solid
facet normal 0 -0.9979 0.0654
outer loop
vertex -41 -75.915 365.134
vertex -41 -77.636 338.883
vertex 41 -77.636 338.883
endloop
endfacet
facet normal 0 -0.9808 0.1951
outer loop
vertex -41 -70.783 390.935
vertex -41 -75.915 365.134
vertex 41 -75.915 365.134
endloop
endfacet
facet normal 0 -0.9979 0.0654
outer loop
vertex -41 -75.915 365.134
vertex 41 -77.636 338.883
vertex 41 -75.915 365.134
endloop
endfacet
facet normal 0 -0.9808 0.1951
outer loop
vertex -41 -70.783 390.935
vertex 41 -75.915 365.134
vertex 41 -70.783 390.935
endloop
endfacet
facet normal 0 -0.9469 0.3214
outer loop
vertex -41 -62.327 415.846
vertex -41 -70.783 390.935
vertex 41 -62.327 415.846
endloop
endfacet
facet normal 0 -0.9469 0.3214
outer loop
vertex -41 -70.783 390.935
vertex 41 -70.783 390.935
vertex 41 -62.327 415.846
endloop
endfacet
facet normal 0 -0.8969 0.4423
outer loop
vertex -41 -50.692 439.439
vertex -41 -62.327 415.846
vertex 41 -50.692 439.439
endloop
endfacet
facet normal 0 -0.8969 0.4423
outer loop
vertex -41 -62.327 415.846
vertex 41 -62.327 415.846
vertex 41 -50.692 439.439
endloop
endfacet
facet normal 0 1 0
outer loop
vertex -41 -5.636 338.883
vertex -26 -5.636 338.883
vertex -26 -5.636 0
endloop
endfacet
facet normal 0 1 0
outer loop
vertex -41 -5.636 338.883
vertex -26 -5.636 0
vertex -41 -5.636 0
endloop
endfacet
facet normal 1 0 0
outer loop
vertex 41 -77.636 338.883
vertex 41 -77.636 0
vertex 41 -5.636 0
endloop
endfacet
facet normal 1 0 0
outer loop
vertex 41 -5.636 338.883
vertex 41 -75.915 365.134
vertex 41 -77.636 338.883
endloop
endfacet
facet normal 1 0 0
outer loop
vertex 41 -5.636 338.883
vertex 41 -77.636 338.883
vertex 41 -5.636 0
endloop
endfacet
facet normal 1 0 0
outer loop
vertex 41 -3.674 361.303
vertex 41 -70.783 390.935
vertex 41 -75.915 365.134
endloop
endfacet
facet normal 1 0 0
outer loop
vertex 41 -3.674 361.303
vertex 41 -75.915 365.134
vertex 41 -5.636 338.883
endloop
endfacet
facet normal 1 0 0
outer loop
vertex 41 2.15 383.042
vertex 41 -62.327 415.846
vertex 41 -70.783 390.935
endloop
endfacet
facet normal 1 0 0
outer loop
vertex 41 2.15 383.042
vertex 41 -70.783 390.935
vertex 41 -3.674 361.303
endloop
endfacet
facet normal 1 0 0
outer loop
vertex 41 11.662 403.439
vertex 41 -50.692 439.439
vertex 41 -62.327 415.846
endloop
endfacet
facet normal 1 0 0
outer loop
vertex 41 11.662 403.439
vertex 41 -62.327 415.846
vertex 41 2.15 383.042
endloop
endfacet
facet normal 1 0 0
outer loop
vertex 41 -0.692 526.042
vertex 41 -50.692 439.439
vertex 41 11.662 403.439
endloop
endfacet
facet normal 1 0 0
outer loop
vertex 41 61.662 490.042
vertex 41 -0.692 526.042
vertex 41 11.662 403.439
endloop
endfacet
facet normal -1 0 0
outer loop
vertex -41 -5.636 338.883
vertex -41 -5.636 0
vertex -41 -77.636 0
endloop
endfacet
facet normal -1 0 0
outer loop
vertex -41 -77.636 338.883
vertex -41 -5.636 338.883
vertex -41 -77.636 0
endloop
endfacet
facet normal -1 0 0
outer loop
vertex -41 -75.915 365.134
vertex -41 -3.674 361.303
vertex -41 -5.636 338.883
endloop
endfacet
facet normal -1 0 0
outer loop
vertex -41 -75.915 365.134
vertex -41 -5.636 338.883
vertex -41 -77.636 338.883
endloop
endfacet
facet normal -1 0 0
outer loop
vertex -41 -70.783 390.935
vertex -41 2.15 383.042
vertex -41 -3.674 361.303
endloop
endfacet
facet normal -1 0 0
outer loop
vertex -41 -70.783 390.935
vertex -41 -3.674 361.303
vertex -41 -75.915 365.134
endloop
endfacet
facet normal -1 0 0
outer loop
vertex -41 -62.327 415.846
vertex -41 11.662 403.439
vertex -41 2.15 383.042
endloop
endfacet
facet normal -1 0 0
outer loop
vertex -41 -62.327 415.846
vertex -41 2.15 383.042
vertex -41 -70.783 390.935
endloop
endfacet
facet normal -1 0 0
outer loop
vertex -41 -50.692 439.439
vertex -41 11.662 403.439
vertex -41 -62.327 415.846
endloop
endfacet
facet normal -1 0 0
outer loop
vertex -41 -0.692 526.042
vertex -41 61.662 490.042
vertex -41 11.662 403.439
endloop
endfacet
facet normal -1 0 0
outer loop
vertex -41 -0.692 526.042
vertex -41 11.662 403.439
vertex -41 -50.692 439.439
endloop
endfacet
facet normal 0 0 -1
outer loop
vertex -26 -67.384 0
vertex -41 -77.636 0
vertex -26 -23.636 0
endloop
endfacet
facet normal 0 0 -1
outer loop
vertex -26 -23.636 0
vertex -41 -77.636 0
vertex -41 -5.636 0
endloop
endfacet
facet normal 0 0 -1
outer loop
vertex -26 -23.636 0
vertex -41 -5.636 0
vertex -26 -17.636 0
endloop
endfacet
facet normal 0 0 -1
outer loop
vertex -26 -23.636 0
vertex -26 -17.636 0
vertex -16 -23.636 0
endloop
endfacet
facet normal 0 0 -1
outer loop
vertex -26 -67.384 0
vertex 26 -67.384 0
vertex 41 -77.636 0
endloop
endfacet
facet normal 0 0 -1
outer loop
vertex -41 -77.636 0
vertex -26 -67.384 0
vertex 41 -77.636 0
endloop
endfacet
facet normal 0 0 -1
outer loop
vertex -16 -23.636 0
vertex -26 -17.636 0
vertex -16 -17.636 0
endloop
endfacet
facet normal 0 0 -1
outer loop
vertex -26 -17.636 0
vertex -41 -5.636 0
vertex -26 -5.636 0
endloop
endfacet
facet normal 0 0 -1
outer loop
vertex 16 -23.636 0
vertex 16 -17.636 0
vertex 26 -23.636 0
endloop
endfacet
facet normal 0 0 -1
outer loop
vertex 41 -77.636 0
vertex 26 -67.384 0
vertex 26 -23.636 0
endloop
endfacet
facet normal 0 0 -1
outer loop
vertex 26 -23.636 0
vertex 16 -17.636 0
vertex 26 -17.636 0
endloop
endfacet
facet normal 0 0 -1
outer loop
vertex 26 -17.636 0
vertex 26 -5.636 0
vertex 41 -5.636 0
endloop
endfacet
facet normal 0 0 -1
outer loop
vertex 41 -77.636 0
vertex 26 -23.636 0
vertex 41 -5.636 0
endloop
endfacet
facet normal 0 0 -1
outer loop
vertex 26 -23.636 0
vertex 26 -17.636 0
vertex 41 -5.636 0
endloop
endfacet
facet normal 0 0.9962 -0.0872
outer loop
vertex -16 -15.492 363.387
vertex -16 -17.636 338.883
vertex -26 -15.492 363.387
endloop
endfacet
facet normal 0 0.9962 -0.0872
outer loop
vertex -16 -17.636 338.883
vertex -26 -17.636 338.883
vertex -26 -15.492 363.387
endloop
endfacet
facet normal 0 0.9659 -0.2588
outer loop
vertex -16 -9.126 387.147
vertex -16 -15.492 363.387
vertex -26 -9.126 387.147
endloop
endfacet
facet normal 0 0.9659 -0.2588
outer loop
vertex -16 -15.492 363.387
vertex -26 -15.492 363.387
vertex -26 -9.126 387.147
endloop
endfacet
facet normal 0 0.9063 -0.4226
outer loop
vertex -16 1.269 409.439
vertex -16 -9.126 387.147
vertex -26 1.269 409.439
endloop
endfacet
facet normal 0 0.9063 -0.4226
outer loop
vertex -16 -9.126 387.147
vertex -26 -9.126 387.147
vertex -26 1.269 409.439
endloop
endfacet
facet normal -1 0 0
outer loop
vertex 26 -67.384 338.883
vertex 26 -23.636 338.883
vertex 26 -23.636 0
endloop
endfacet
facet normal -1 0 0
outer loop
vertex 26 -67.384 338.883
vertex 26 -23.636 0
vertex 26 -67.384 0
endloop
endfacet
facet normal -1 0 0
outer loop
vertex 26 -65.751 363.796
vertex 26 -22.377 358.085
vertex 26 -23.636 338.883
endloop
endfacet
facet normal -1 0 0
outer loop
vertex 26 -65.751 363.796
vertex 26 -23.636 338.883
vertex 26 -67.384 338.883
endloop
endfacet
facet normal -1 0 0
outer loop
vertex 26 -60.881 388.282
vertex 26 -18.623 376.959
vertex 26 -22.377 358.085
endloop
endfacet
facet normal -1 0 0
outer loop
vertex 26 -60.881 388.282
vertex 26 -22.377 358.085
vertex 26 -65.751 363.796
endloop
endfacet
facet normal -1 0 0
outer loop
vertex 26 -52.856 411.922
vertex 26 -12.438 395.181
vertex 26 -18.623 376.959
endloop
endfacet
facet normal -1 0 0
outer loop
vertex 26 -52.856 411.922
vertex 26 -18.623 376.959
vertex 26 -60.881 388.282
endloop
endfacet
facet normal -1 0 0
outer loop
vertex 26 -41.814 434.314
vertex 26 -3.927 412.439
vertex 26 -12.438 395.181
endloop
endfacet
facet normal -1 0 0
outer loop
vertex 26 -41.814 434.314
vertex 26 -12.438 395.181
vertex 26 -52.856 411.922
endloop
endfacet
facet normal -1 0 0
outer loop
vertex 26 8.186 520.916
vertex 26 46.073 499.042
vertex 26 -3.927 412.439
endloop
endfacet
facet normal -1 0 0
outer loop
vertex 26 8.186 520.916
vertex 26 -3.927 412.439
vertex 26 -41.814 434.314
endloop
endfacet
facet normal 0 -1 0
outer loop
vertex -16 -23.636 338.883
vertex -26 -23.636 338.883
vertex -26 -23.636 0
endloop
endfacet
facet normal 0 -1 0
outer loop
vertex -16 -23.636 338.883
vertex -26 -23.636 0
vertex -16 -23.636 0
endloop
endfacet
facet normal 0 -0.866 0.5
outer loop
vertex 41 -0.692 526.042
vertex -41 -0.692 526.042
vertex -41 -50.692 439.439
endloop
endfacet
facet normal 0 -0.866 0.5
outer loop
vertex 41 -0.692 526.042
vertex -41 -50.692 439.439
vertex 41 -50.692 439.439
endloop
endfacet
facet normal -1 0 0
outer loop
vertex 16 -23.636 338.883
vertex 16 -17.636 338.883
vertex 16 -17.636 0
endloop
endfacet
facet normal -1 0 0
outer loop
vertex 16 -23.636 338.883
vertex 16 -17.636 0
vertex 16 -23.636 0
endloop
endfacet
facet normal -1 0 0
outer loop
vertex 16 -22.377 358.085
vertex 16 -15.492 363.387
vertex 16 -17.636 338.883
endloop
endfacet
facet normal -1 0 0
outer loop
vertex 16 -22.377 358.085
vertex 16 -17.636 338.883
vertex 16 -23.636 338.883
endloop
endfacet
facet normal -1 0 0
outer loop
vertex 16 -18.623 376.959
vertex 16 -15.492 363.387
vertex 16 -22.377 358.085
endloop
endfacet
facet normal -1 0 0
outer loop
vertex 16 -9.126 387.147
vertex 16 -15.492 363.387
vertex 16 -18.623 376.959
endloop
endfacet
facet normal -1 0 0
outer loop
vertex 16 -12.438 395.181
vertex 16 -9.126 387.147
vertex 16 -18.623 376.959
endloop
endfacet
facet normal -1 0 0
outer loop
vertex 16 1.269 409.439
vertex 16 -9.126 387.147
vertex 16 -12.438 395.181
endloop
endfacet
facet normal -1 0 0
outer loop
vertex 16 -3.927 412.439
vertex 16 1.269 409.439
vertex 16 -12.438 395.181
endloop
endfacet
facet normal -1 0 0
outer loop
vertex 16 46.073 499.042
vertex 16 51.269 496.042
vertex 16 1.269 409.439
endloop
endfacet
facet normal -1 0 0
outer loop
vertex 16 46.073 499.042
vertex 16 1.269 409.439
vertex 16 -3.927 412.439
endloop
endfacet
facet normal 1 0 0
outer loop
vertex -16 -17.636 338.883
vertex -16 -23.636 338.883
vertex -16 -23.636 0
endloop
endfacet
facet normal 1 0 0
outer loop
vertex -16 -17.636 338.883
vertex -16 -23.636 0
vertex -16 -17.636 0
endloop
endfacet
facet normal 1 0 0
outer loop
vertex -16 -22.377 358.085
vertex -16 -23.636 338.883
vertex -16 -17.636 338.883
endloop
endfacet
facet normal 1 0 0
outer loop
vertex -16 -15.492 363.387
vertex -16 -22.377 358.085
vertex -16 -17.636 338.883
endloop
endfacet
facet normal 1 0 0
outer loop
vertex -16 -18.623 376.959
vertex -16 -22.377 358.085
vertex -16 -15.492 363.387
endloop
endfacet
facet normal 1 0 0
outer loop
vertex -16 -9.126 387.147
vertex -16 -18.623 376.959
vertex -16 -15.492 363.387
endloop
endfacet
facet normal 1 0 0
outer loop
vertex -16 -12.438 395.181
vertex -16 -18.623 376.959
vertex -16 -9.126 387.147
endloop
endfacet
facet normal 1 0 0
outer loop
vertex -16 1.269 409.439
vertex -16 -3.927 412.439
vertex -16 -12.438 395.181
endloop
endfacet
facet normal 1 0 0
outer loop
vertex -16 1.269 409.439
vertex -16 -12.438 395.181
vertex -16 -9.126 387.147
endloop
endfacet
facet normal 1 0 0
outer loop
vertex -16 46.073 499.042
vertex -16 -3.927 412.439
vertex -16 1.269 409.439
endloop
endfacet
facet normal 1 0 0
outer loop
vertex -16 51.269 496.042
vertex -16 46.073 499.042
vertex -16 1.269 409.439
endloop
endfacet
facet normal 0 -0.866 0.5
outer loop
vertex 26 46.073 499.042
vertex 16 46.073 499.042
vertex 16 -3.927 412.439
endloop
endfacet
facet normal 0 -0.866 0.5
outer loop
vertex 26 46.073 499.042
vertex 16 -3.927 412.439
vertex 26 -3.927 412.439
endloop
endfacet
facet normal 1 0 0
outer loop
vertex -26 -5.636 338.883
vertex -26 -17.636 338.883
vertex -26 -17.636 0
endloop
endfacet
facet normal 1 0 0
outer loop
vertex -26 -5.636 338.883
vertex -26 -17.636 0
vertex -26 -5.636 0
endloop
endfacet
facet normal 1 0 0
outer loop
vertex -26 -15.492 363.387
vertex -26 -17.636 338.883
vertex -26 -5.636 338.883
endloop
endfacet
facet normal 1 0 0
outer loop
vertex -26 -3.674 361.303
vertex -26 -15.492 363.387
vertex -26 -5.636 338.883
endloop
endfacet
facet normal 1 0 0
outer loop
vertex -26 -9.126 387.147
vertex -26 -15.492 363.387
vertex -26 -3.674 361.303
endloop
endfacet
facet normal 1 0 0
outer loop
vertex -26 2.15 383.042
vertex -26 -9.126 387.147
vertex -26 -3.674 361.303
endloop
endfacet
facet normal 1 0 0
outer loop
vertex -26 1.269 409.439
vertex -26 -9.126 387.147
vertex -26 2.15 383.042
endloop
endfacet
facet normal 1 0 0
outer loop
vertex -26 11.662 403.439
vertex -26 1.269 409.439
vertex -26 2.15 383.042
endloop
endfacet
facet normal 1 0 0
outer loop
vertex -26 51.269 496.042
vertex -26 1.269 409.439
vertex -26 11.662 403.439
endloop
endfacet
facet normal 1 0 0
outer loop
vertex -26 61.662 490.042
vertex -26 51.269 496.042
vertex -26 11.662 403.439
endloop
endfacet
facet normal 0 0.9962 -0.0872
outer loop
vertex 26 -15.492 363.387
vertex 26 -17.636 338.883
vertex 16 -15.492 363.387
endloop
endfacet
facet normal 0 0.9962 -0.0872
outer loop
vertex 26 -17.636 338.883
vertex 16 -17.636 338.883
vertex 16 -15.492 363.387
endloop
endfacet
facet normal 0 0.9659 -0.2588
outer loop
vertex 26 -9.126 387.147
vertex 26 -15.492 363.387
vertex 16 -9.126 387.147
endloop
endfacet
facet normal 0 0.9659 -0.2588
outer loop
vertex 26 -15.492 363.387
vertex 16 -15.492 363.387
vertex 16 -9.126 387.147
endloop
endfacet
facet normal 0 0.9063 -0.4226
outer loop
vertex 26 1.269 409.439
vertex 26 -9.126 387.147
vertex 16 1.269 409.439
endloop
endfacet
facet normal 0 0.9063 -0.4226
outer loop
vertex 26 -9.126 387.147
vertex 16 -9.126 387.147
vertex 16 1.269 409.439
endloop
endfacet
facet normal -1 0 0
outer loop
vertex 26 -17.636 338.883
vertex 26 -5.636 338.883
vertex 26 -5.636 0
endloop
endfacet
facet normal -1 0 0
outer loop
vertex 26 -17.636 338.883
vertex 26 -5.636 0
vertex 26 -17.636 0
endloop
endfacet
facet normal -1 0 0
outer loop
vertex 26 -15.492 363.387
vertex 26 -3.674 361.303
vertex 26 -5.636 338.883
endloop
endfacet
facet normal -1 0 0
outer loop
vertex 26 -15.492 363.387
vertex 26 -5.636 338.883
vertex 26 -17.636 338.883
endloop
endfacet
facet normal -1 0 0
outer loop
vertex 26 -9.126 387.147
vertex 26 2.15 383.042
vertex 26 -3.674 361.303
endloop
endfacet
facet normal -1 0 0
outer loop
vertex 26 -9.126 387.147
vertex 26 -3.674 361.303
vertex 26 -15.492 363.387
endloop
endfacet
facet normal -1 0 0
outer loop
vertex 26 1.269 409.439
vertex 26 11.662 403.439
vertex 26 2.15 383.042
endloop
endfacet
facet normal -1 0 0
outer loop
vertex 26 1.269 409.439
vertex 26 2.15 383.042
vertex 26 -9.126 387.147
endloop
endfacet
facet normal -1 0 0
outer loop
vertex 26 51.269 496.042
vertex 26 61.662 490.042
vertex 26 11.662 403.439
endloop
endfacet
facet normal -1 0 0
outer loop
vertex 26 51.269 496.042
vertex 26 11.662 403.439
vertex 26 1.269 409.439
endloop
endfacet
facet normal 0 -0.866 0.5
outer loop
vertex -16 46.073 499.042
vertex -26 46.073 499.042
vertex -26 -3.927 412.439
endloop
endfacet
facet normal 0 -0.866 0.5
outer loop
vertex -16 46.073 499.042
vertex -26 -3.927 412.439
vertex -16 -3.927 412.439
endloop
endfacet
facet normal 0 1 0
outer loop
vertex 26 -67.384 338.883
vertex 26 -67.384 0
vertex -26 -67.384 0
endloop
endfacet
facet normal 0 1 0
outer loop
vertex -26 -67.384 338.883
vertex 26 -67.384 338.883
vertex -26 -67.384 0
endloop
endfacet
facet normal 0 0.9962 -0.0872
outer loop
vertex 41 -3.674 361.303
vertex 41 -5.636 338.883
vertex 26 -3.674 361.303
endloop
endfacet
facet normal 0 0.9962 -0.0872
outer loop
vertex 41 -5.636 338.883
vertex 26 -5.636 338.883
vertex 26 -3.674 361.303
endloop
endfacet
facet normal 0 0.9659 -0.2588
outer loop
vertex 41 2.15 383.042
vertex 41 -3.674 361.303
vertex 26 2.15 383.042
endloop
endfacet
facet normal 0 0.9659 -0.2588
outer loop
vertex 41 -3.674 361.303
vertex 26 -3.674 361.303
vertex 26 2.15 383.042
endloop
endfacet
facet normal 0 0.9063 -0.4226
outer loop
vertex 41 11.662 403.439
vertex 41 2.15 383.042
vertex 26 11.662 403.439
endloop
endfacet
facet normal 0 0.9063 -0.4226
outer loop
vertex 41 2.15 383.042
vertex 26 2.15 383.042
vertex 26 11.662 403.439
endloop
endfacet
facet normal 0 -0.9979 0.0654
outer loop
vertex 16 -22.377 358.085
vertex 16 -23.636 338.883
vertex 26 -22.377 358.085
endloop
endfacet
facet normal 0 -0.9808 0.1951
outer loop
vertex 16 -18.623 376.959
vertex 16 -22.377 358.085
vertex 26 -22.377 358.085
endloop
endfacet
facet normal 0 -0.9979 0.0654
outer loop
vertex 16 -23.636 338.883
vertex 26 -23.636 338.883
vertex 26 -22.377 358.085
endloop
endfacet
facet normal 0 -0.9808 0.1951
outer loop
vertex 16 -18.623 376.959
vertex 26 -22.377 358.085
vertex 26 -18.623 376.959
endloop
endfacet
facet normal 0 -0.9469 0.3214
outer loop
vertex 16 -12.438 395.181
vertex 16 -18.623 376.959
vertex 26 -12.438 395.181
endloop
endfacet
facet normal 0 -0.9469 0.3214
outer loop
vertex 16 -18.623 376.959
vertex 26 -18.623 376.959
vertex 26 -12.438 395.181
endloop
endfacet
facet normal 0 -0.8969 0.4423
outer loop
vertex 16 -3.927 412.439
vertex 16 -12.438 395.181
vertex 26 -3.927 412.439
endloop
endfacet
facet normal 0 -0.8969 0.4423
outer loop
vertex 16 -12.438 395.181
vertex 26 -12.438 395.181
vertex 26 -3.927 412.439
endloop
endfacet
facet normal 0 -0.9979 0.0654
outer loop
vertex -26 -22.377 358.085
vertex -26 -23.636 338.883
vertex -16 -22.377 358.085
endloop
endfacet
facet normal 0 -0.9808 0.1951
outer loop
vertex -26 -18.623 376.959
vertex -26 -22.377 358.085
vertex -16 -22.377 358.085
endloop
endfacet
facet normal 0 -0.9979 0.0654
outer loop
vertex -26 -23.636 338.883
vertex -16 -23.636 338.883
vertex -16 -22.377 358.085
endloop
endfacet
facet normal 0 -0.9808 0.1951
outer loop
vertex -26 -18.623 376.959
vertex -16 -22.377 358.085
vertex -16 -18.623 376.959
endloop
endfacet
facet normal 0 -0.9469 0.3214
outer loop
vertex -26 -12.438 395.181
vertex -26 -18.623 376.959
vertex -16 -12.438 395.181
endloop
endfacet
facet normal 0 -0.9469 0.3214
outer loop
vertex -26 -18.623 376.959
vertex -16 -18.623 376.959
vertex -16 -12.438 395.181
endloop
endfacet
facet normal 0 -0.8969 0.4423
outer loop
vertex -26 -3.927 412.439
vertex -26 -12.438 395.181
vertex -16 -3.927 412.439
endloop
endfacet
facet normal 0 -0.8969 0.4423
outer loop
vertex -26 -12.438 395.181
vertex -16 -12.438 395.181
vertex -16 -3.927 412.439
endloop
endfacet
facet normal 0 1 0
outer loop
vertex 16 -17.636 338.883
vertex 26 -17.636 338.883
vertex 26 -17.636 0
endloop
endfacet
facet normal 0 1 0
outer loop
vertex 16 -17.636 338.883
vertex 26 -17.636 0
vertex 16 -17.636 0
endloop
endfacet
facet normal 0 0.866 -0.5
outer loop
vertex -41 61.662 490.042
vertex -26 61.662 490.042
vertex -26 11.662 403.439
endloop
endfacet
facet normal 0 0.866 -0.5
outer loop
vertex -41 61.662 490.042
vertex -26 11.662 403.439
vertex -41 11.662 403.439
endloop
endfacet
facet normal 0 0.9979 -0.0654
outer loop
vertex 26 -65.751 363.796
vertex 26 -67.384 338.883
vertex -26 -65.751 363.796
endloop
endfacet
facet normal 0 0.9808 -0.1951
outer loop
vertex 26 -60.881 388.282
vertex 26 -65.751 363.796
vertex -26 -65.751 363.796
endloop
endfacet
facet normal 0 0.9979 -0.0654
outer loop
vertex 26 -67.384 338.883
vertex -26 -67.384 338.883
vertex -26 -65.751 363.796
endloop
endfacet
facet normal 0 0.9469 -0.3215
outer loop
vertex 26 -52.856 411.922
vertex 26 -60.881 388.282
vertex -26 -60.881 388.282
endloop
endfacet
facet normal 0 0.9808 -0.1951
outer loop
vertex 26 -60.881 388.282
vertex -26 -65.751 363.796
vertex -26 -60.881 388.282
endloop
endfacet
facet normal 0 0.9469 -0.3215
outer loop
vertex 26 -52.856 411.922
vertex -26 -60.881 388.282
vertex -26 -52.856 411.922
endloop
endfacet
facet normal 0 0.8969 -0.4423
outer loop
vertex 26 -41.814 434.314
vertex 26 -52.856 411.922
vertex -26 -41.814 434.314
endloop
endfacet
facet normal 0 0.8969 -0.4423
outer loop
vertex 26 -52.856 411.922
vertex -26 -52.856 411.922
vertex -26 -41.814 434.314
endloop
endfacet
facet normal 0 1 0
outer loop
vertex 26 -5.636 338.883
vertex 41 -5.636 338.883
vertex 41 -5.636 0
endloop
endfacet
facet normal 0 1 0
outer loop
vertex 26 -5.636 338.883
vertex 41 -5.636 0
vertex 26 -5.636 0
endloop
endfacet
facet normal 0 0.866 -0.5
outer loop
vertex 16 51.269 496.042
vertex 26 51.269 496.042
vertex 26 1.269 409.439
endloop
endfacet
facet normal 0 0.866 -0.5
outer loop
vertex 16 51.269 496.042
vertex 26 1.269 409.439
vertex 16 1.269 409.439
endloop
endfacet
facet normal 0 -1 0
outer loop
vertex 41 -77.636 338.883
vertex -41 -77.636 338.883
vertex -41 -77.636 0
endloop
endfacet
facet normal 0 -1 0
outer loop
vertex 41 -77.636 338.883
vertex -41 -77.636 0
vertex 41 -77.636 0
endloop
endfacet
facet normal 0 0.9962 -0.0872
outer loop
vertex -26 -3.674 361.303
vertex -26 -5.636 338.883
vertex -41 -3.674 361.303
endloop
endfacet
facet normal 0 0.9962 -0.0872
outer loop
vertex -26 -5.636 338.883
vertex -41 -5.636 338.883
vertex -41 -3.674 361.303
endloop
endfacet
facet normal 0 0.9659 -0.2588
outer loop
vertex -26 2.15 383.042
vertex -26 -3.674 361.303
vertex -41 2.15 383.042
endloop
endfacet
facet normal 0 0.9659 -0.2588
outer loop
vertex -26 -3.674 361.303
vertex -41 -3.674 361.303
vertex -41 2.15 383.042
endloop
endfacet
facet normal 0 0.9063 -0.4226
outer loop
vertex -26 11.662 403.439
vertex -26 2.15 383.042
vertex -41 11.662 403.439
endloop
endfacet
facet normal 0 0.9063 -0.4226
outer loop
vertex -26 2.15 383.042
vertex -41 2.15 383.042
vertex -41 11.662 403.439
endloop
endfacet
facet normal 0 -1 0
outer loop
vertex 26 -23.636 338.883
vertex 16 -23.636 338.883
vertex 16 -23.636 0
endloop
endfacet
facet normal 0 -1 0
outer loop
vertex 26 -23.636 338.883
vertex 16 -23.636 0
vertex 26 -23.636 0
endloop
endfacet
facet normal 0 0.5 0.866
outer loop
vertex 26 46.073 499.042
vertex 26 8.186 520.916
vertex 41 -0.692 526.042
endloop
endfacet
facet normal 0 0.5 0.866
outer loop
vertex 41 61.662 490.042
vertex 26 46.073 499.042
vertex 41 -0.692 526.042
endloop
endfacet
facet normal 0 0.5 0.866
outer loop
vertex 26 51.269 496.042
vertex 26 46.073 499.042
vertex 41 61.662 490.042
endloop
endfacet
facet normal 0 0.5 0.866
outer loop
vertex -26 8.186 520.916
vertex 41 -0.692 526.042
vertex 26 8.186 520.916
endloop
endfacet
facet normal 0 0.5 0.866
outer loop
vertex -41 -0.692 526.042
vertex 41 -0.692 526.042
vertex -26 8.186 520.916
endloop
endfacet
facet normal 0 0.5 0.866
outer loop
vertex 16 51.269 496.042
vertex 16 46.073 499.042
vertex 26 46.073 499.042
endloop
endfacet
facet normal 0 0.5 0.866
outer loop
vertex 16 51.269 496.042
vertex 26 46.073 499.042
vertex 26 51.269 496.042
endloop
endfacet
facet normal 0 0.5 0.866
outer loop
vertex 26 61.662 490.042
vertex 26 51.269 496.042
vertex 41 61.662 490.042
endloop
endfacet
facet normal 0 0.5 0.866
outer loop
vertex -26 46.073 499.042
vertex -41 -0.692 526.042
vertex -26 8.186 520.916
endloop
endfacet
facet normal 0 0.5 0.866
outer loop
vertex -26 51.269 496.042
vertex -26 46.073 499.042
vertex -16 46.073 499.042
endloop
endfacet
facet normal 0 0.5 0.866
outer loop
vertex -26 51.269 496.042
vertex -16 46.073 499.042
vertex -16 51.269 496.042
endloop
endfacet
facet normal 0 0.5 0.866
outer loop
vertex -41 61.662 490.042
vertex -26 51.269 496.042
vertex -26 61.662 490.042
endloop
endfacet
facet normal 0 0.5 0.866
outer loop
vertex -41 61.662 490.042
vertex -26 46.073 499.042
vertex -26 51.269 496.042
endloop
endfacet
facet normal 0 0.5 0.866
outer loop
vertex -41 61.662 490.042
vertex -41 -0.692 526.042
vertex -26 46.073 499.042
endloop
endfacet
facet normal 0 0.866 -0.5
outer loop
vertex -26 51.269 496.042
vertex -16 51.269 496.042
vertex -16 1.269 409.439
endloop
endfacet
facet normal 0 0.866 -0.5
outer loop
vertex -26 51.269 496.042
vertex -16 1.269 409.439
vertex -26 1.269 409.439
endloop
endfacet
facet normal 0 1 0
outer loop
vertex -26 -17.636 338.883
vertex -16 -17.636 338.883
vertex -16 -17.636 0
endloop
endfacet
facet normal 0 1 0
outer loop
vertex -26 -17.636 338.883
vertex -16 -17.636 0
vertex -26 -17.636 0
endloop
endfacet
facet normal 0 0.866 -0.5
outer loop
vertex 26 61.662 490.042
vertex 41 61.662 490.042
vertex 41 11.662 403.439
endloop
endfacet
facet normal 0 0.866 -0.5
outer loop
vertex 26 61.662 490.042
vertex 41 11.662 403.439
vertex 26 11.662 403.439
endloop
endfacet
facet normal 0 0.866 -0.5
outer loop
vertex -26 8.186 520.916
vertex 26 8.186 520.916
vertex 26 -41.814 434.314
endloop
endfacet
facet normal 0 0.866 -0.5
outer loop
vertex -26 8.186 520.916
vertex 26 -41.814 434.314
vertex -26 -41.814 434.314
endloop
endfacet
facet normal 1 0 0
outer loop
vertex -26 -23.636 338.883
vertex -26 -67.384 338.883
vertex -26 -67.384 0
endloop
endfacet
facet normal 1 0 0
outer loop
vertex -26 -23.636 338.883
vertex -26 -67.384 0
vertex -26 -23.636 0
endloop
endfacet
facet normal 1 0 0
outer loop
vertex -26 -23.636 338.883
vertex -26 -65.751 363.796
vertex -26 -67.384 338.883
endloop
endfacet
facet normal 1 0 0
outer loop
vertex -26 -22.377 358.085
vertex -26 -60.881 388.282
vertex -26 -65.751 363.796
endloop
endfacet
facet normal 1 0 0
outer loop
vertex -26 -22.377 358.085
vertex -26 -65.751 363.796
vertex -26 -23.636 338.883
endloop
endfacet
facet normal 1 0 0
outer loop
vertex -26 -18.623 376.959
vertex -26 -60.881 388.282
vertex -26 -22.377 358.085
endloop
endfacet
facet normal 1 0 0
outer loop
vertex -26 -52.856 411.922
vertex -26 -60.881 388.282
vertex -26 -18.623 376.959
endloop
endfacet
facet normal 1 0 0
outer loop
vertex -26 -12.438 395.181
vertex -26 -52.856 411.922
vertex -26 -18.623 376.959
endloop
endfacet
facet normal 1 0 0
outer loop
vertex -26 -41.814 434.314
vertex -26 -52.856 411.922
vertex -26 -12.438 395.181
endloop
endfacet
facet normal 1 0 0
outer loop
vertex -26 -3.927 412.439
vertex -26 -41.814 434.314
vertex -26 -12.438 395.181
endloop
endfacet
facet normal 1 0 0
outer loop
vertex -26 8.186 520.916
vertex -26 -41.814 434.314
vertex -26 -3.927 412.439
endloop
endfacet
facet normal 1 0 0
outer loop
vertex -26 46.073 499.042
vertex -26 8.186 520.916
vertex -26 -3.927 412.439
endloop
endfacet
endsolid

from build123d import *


with BuildPart() as part:
    # 扫描2: sweep along a path in 草图3
    with BuildLine(Plane(origin=(0, 0, 0), x_dir=(0, 0, -1), z_dir=(1, 0, 0))) as sweep_2_path:
        Line((0, -36.524100396), (-338.88345961, -36.524100396))
        ThreePointArc((-338.88345961, -36.524100396), (-380.294506826, -31.072232602), (-418.88345961, -15.088165001))
        Line((-418.88345961, -15.088165001), (-505.485999988, 34.911834999))
    # 草图2 → 扫描2 (sweep)
    with BuildSketch(Plane.XY):
        Polygon((-41, -55.412292473), (-41, -77.635908318), (41, -77.635908318), (41, -55.412292473), (41, -17.635908318), (41, -5.635908318), (26, -5.635908318), (26, -17.635908318), (16, -17.635908318), (16, -23.635908318), (26, -23.635908318), (26, -67.384306902), (-26, -67.384306902), (-26, -23.635908318), (-16, -23.635908318), (-16, -17.635908318), (-26, -17.635908318), (-26, -5.635908318), (-41, -5.635908318), (-41, -17.635908318), align=None)
    sweep(path=sweep_2_path.line)


solid = part.part
